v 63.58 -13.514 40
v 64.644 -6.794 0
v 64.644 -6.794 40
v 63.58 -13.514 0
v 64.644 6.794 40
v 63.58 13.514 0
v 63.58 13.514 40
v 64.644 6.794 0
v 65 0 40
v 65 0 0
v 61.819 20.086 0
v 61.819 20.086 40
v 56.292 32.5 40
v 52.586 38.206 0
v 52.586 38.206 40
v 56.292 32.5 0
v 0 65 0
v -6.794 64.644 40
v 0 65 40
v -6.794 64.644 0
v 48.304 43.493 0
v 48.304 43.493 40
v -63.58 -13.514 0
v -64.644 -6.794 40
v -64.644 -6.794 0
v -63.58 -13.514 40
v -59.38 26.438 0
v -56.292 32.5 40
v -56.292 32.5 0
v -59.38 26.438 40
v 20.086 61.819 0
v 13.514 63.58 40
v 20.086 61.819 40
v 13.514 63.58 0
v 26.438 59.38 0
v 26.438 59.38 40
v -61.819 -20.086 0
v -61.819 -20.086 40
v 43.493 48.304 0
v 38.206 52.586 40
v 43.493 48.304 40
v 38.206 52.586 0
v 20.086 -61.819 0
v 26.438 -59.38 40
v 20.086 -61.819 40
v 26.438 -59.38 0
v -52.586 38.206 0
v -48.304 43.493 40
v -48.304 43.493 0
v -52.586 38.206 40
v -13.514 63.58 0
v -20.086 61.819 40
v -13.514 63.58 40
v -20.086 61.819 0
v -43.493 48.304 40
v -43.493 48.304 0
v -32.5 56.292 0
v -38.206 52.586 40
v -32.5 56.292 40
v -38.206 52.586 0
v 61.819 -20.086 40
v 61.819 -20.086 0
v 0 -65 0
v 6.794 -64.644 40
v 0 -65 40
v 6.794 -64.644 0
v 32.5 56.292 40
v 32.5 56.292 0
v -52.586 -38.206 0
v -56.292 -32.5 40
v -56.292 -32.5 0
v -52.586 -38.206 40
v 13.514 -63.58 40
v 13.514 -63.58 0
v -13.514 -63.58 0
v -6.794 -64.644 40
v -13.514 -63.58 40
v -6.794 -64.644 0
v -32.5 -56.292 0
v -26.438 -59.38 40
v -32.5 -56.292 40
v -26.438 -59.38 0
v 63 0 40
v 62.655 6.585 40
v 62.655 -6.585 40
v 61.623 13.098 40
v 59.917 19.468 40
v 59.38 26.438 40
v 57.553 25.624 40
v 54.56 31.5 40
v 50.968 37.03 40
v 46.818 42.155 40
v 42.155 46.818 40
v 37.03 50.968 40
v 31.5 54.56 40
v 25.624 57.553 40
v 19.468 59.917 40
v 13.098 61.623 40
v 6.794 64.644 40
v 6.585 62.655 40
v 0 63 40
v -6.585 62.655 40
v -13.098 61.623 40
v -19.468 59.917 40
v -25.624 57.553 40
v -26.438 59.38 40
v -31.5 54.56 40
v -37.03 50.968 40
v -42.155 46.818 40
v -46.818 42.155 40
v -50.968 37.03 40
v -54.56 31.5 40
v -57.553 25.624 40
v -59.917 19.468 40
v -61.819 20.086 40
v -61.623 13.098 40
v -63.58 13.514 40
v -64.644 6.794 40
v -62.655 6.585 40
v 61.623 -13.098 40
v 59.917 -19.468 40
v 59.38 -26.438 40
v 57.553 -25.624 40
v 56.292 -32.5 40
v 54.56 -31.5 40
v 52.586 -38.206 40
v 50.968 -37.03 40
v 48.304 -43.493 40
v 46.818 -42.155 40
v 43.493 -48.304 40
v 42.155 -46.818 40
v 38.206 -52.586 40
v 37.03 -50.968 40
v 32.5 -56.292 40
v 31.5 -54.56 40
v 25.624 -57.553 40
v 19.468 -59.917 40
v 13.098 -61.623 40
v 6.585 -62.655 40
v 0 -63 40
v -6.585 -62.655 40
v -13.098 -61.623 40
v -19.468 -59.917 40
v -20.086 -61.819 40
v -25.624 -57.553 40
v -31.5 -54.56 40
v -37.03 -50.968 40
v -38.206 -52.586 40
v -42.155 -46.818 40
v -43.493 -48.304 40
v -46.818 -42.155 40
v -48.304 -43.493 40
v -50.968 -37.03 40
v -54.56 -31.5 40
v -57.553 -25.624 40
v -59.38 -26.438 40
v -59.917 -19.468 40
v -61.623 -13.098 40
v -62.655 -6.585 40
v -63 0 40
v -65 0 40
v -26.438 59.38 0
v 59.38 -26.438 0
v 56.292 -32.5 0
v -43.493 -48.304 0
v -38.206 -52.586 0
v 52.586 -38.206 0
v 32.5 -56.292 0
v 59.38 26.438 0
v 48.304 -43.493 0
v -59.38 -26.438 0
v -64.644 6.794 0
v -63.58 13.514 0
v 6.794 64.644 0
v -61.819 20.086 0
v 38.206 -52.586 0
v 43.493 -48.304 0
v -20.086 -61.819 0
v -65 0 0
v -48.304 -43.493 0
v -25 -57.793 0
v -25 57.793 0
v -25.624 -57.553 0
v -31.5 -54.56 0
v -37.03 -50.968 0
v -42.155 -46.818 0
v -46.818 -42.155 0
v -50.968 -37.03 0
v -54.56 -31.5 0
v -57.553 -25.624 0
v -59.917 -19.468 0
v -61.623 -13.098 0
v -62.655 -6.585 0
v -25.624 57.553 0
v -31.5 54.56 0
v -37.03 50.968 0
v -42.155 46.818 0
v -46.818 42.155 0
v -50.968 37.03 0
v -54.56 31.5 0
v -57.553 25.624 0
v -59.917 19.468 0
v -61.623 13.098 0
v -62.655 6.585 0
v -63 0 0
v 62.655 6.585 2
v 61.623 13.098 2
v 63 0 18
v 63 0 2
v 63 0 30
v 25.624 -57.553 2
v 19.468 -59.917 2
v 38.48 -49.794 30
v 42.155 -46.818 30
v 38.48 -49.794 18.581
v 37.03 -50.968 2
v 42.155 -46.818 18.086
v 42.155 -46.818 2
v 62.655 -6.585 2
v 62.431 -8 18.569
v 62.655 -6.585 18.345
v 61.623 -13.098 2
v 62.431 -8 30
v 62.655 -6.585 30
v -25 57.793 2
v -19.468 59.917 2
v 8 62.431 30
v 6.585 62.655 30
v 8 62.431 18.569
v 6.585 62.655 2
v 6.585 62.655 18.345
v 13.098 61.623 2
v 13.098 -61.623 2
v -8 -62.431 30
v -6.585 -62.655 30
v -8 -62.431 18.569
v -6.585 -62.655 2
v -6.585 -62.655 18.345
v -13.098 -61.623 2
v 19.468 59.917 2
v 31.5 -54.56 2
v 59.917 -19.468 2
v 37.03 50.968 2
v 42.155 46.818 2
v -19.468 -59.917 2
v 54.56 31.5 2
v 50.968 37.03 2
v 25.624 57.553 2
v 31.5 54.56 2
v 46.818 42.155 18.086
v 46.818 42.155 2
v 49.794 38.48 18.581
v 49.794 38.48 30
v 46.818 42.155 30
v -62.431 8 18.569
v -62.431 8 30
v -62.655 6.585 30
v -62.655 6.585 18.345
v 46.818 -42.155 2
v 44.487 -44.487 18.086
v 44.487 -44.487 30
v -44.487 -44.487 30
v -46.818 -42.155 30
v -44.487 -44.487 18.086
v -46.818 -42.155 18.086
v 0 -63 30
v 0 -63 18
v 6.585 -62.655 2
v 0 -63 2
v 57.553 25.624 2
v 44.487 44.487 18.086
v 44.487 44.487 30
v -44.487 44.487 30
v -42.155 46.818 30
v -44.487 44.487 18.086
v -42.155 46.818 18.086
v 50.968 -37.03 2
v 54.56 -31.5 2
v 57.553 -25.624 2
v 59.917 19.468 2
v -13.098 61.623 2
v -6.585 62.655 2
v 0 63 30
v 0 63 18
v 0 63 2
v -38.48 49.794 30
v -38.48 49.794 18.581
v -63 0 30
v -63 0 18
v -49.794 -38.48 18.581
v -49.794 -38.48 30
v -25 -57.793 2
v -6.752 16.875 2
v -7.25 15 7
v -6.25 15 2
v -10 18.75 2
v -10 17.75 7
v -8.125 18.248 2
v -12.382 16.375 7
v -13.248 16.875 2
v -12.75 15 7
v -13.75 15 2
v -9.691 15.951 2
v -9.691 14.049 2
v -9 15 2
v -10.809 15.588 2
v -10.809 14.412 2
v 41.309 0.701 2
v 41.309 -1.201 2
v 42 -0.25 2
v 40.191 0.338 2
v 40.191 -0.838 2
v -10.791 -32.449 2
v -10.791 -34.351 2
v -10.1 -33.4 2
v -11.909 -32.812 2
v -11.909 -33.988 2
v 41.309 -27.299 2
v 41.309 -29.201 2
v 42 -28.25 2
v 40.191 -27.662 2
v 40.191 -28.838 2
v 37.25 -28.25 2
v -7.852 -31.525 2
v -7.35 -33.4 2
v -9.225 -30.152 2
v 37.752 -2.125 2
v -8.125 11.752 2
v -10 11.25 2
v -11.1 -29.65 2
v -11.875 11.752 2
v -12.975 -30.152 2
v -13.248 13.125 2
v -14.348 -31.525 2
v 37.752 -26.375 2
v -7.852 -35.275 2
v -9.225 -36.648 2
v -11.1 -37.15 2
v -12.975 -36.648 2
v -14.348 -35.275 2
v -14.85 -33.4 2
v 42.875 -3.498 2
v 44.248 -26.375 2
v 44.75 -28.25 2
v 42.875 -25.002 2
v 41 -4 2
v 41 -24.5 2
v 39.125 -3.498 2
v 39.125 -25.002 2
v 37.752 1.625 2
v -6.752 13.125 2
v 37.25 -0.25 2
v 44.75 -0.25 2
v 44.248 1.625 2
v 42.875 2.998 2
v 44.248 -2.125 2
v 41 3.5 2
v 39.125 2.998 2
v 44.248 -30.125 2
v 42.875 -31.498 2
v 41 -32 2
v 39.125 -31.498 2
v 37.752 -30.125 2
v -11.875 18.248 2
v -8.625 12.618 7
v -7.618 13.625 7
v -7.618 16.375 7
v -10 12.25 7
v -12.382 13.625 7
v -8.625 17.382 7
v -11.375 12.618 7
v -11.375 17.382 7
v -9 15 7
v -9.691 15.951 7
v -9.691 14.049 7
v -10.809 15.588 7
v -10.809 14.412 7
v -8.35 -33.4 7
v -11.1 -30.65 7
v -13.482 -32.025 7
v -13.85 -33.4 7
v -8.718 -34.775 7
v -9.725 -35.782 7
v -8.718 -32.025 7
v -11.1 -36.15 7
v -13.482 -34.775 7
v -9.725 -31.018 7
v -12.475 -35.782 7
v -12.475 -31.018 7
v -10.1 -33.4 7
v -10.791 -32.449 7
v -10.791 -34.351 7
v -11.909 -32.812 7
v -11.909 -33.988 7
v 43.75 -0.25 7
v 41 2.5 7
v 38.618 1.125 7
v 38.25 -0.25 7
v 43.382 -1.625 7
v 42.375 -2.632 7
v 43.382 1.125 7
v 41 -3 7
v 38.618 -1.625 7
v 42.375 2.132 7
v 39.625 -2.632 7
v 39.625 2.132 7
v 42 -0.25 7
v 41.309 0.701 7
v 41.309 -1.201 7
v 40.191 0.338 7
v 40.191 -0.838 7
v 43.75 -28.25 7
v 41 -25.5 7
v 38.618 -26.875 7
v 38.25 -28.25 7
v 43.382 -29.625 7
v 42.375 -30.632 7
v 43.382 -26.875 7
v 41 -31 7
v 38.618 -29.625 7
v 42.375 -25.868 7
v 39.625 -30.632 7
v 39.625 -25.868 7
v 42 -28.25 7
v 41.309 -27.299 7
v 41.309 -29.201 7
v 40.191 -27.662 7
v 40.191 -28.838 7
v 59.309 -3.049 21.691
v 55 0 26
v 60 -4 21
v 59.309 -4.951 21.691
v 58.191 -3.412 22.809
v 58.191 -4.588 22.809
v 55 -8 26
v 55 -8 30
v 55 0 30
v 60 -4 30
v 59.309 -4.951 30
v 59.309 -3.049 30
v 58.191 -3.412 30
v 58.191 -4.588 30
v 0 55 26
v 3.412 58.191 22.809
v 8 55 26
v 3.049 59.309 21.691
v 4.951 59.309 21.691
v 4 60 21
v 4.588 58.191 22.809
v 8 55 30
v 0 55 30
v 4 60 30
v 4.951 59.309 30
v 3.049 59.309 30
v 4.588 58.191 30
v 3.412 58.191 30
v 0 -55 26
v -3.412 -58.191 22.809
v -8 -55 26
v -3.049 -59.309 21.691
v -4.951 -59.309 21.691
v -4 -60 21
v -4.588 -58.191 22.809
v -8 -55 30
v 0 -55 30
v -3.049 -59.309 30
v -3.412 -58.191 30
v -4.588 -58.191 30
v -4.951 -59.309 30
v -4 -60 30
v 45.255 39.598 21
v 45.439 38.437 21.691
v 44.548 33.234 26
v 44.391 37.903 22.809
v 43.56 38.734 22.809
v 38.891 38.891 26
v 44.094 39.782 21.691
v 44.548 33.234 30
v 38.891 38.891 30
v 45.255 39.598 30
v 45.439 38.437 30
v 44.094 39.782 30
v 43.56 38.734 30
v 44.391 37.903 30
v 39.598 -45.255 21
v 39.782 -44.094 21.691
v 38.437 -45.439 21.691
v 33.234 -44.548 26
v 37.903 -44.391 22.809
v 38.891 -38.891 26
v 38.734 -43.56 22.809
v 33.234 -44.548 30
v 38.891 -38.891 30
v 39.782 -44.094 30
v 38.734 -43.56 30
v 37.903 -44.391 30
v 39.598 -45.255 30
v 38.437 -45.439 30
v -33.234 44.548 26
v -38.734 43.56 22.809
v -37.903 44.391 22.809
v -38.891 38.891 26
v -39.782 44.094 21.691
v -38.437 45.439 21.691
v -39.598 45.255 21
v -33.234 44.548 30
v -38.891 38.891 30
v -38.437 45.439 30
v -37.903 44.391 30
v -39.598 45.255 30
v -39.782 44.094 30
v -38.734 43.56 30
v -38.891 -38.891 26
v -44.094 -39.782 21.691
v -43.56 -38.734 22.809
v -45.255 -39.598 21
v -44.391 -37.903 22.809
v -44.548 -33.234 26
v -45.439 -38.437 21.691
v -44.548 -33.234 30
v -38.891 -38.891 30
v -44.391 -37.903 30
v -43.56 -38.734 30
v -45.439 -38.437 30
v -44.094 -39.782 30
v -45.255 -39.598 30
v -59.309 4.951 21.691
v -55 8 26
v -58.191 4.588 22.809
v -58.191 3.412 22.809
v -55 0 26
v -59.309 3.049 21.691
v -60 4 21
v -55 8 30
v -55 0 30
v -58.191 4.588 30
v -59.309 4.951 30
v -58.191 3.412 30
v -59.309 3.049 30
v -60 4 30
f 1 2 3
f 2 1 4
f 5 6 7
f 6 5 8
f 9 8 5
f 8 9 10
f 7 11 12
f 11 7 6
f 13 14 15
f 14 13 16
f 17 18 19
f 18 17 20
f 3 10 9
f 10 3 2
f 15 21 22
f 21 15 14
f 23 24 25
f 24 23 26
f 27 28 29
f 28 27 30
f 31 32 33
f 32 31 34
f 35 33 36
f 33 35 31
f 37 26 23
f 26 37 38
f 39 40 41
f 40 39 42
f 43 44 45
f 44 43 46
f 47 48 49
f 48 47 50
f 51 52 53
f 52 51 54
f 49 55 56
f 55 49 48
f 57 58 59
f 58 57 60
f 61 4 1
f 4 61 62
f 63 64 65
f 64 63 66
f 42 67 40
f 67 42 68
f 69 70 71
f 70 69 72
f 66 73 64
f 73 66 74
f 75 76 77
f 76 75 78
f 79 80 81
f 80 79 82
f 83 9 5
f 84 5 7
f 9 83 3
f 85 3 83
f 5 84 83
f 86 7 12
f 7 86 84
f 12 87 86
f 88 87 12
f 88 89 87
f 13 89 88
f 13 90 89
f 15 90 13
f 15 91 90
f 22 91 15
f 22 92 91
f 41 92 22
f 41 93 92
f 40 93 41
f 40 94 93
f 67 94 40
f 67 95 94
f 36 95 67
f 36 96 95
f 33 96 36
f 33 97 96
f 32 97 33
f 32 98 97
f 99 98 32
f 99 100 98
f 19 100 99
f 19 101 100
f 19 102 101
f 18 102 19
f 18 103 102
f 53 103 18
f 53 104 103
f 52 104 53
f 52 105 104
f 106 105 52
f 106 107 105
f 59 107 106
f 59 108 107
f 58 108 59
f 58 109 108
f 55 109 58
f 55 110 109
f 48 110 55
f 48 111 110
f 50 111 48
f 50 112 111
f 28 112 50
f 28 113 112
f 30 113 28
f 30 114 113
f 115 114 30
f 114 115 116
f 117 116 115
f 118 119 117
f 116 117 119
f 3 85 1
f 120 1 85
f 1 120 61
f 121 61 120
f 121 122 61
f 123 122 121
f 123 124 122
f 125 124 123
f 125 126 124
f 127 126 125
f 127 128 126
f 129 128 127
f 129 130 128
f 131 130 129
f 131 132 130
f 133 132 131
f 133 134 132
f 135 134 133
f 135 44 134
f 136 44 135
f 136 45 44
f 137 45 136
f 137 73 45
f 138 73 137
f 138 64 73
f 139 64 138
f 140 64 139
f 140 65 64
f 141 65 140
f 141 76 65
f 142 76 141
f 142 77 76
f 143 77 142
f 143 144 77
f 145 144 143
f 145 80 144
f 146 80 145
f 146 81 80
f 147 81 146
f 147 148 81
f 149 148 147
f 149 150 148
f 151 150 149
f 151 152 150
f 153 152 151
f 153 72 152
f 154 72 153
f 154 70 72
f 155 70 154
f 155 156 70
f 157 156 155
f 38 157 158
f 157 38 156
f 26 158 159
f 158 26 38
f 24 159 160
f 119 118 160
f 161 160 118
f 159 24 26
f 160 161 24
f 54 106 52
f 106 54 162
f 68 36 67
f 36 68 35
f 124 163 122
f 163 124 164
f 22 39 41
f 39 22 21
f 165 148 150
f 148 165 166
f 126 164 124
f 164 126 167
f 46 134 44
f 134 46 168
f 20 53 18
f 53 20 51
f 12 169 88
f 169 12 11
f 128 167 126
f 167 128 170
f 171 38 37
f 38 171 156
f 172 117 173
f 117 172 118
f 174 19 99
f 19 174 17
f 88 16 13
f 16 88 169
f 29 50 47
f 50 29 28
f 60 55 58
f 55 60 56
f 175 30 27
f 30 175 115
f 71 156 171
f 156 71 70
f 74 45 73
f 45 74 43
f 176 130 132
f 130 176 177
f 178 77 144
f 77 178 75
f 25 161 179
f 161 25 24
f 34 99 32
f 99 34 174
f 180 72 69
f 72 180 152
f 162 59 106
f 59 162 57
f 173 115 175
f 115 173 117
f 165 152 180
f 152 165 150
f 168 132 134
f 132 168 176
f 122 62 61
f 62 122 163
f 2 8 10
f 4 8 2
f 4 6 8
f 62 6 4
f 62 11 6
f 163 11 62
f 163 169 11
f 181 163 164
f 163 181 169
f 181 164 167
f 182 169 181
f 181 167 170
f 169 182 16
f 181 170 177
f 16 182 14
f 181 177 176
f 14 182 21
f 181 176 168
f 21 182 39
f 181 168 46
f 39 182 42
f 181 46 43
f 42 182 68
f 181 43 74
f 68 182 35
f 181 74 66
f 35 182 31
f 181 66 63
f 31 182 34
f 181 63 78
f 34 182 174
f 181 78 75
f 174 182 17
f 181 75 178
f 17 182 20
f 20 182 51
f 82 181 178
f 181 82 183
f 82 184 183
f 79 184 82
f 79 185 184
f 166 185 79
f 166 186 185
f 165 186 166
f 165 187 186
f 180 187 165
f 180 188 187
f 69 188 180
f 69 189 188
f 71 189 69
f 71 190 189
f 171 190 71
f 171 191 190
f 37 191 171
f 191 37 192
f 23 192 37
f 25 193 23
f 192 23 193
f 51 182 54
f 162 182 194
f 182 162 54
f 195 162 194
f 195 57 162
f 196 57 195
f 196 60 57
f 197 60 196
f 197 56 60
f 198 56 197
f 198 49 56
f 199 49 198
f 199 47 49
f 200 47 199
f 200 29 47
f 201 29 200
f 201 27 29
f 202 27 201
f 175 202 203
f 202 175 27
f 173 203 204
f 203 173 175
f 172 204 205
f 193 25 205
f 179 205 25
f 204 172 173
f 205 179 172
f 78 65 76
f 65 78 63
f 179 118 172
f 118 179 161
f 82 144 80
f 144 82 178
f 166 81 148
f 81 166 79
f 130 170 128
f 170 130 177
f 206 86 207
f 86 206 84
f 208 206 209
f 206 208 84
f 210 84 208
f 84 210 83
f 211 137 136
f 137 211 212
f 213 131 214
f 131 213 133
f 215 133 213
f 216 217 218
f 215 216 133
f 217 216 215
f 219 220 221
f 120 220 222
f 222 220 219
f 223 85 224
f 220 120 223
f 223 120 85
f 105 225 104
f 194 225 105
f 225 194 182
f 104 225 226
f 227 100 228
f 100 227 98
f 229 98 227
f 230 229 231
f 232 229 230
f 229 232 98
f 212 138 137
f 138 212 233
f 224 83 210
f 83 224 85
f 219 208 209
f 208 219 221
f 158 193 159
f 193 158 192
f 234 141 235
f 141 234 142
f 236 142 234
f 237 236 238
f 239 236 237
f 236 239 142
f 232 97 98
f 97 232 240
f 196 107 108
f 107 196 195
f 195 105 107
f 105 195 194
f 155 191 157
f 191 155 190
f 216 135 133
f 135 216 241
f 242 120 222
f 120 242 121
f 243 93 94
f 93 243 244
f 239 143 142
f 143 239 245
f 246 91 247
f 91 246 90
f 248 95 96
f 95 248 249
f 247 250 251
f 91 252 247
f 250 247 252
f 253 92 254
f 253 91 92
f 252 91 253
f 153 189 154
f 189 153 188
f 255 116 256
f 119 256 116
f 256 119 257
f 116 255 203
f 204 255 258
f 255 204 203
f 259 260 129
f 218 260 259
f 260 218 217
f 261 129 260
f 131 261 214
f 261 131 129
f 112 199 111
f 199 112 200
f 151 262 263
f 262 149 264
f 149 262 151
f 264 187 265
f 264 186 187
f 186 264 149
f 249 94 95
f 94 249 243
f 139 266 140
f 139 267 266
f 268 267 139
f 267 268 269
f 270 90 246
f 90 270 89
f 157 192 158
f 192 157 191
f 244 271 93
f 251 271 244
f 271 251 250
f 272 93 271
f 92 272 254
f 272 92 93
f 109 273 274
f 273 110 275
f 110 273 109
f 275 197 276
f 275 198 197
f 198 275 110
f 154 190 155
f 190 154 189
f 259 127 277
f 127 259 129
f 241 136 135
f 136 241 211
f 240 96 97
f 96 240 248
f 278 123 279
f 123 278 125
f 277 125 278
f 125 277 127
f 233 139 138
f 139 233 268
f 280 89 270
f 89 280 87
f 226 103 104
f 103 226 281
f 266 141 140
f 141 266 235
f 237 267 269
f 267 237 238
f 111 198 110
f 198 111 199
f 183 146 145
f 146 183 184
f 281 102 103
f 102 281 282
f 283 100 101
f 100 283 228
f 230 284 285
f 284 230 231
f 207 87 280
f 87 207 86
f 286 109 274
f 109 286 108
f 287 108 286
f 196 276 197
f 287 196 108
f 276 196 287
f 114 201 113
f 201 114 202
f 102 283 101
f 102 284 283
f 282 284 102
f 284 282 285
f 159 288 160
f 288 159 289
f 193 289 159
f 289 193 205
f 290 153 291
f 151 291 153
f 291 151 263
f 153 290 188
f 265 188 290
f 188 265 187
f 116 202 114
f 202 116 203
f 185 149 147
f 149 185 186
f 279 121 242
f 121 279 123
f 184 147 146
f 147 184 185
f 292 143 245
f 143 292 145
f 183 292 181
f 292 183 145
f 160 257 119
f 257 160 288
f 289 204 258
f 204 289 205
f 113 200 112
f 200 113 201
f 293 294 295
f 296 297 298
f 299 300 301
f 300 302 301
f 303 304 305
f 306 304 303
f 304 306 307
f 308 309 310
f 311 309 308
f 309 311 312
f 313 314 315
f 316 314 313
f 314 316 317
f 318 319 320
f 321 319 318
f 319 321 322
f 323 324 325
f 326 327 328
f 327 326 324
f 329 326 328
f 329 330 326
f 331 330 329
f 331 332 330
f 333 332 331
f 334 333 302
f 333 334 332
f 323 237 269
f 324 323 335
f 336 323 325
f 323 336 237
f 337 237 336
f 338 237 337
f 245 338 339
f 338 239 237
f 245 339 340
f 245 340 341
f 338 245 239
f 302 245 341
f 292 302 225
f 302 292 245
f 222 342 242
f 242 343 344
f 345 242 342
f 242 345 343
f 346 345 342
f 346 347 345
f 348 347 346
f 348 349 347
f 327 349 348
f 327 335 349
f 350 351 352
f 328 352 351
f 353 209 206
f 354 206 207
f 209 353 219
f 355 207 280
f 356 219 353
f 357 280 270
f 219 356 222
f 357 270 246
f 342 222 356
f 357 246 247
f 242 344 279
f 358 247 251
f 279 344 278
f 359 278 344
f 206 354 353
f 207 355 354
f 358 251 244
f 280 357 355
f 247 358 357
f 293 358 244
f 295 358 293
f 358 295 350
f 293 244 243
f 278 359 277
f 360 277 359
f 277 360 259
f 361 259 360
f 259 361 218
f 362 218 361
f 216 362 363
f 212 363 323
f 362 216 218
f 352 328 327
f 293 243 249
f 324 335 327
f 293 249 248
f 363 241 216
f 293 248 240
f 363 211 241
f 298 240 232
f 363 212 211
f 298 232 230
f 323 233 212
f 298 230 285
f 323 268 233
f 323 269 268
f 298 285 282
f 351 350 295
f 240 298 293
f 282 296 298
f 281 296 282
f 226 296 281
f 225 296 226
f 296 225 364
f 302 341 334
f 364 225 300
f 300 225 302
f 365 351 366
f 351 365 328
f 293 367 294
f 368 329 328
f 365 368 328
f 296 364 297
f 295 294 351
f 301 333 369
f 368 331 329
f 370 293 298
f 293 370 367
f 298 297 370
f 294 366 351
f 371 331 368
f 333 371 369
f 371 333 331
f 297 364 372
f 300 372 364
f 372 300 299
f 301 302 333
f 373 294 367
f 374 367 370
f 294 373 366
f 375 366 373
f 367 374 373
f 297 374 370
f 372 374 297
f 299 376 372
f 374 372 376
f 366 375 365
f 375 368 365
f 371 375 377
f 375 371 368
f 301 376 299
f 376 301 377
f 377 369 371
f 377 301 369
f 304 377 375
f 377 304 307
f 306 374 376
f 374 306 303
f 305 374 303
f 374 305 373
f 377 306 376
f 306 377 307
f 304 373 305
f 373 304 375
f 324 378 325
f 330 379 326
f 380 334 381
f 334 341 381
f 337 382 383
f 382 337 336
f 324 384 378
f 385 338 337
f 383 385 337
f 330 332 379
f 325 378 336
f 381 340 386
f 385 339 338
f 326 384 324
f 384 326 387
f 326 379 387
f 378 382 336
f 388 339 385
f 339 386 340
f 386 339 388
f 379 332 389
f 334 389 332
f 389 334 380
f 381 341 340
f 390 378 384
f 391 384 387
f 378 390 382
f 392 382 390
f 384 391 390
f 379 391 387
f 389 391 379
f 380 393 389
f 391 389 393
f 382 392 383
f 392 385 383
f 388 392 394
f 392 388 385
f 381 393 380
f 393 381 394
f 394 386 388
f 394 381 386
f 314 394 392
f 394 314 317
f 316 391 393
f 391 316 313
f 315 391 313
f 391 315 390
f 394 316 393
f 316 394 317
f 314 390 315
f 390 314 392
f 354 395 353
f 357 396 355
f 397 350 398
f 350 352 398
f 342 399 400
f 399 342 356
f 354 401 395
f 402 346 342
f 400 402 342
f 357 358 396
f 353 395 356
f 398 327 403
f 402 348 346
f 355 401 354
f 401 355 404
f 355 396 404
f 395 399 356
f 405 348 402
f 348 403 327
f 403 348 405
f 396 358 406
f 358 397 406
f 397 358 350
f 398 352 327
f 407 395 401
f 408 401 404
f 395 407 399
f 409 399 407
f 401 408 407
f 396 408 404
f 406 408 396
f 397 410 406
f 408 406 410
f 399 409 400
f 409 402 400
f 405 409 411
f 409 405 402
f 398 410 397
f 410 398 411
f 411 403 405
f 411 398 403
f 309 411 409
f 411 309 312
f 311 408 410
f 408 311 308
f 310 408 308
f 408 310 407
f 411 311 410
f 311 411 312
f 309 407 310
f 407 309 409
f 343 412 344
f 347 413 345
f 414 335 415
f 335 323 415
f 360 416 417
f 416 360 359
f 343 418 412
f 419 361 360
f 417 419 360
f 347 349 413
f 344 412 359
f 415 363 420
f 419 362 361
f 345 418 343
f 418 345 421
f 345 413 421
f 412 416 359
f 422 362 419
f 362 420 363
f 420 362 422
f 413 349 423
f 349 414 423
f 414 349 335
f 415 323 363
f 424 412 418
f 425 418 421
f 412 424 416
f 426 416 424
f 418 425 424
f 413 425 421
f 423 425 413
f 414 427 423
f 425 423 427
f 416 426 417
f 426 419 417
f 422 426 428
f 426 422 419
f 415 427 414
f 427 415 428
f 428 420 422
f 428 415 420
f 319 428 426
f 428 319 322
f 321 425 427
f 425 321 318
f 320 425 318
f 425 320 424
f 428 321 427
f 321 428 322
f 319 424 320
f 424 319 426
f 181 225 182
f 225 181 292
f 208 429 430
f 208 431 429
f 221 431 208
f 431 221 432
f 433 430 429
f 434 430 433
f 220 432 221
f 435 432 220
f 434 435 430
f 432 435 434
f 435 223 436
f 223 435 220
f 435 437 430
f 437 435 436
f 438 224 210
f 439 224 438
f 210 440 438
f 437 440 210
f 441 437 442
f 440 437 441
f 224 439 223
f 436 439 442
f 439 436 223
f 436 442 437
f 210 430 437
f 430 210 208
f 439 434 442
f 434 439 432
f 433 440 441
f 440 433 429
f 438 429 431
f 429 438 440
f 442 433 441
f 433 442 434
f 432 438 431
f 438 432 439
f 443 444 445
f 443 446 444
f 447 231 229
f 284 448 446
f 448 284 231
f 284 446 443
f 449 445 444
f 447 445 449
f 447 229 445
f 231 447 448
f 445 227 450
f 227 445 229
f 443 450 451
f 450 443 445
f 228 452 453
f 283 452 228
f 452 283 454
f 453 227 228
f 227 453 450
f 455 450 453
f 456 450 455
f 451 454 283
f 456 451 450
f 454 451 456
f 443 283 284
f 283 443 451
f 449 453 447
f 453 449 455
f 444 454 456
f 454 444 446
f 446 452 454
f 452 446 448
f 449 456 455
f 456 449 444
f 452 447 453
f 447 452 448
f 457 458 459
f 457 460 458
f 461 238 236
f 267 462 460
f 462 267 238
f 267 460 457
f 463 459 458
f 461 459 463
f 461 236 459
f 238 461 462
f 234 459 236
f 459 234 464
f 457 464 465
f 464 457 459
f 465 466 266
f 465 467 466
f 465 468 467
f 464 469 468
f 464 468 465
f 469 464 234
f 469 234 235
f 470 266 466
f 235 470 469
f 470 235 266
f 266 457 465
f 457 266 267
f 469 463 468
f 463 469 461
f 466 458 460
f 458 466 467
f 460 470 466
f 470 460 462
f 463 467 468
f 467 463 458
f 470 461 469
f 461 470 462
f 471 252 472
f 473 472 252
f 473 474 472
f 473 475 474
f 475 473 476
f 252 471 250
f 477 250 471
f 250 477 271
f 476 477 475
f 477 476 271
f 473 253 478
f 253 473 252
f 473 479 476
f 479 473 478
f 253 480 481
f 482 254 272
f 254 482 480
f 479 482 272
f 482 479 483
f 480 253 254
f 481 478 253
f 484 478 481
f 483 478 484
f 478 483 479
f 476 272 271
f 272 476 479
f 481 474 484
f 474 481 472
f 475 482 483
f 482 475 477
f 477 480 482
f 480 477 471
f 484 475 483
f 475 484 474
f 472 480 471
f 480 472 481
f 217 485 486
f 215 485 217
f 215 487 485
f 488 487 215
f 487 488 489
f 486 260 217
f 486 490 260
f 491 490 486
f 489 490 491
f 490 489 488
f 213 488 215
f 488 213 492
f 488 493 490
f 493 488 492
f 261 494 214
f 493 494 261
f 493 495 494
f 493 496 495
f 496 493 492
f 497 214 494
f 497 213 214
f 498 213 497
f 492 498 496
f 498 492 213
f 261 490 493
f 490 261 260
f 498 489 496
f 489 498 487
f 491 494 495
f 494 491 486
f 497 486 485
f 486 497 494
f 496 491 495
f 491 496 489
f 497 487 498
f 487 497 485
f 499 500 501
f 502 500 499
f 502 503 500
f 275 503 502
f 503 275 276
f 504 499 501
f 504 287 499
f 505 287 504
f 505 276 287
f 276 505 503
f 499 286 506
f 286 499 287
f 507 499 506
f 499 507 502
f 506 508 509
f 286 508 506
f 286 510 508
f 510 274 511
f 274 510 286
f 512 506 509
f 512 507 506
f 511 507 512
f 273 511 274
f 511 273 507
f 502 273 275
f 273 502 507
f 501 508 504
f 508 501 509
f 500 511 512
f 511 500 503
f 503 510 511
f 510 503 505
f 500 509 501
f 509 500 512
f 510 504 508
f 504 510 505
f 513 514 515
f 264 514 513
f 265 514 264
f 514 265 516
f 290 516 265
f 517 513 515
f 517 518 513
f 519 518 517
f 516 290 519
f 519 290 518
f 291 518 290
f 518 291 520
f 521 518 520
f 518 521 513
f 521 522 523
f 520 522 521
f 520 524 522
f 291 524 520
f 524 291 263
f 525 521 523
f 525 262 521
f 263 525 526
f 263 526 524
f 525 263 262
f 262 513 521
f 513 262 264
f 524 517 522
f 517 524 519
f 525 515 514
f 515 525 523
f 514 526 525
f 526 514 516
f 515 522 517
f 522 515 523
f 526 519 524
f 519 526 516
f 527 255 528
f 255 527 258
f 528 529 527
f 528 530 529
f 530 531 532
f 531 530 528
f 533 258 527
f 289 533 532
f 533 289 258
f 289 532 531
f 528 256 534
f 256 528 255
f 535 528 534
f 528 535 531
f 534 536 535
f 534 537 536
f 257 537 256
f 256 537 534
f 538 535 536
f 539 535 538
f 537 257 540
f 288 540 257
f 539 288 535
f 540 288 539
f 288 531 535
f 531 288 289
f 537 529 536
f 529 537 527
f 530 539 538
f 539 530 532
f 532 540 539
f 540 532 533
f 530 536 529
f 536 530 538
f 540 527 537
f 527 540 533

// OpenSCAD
// file: ../caseutilities.scad
//

module RoundedBox(width,height,thickness,radius)
{
   cube([width-2*radius,height,thickness],true);  
   cube([width,height-2*radius,thickness],true);  
   translate([radius-width/2,radius-height/2,0])
     cylinder(r=radius, h=thickness, center=true);
   translate([radius-width/2,height/2-radius,0])
     cylinder(r=radius, h=thickness, center=true);
   translate([width/2-radius,height/2-radius,0])
     cylinder(r=radius, h=thickness, center=true);
   translate([width/2-radius,radius-height/2,0])
     cylinder(r=radius, h=thickness, center=true);
}

module Standoff(length, inside, outside)
{
  difference()
  {
    cylinder(r1=outside+1, r2=outside, h=length);
    cylinder(r=inside, h=length);
  }
}
module RaiseBoss(holelist)
{
  for(i=holelist){
    if(i[0]=="B") translate([i[1],i[2],0])
    {
      translate([0,0,i[4]])cylinder(r=i[7],h=i[6]);
    }
  }
}
module DrillHoles(holelist)
{
  for(i=holelist){
    if(i[0]=="C") translate([i[1],i[2],0]) cylinder(r=i[3],h=i[4]);
    if(i[0]=="B") translate([i[1],i[2],0])
    {
      cylinder(r=i[3],h=i[4]);
      translate([0,0,i[4]])cylinder(r=i[5],h=i[6]);
    }
    if(i[0]=="S")
    {
      if(i[6]==0)  translate([i[1],i[2],0]) cube([i[3],i[4],i[5]]);
      else
        translate([i[1],i[2],i[5]/2]) RoundedBox(i[3],i[4],i[5],i[6]);
    }
  }
}
module BoxPanel(width, height, thickness, edge, edgethickness, radius, holelist)
{
  shim=(thickness-edgethickness)/2;
  difference()
  {
    union()
    {
      translate([0,0,0]) rotate([90,0,90])
        RoundedBox(width-edge*2,height-edge*2,thickness,radius);
      translate([-shim,0,0]) rotate([90,0,90])
        RoundedBox(width,height,edgethickness,radius);
      translate([-2,0,0]) rotate([90,0,90])RaiseBoss(holelist);
    }
    translate([-2,0,0]) rotate([90,0,90]) DrillHoles(holelist);
  }
}

module TaperPost(inside, outside, height)
{
  difference()
  {
    union()
    {
      cylinder(r=outside-0.75, h=height);
      translate([0,0,outside]) cylinder(r1=outside, r2=outside-0.75, h=height/2-outside);
      cylinder(r=outside, h=outside);
    }
    cylinder(r=inside, h=height);
  }
}
module Keyhole(holesize, headsize, material)
{
  translate([0,0,0.25]) RoundedBox(headsize,holesize,material,holesize/2);
  translate([headsize/2,0,-0.25]) cylinder(r=headsize/2, h=material);
}
module ArdunioStandoffs(length, inside, outside)
{
  Standoff(length, inside, outside);
  translate([-1.1, -48.40, 0]) Standoff(length, inside, outside);
  translate([51, -15.25, 0]) Standoff(length, inside, outside);
  translate([51, -43.25, 0]) Standoff(length, inside, outside);
}
// file: ringlib.scad
module sleeve(od,id,h) {
  difference() {
   cylinder(r=od/2,h=h);
   cylinder(r=id/2,h=h);
  }
}

module halfdome(dia,thick) {
   difference() {
     sphere(r=dia/2);
     sphere(r=(dia-2*thick)/2);
     translate([-dia/2,-dia/2,-dia]) cube([dia,dia,dia]);
   }
}

module suspendedring(od,id,h,outside) {
  w = (od-id)/2;
  points_outside=[[0,h],[-w,h],[-w,w],[0,0]];
  points_inside=[[0,h],[-w,h],[-w,0],[0,w]];
  if(outside) {
    rotate_extrude() translate([od/2,0,0]) polygon(points_outside);
  } else {
    rotate_extrude() translate([od/2,0,0]) polygon(points_inside);
  }
}

module circleplate(r,t,w,h,wo,ho) {
  difference() {
   translate([wo,ho,0])cube([w,h,t]);
   difference() { cylinder(r=r+50,h);cylinder(r=r,h);}
  }
}

module support(width,depth,height, hashole) {
  points=[[0,height],[-depth,height],[-depth,depth],[0,0]];
  if(hashole) {
    difference() {
      rotate([90,0,0]) linear_extrude(height=width) polygon(points);
      translate([-width/2,-depth/2,3]) cylinder(r=1,h=height);
    }
  } else {
    rotate([90,0,0]) linear_extrude(height=width) polygon(points);
  }
}
module connectionring(dia,thick,height,lap){
  translate([0,0,lap-2]) {
    translate([0,0,height-4]) suspendedring(dia+2*thick,dia,lap+2,false);
    suspendedring(dia+.01,dia-2*thick,height,true);
    translate([0,0,4]) rotate([0,180,0]) suspendedring(dia+2*thick,dia,lap+2,false);
  }
}
module washer(out,in,thick) {
  difference() {
    cylinder(r=out/2,h=thick,center=true);
    cylinder(r=in/2,h=thick+.1,center=true);
  }
}

module testringlib(){
  suspendedring(124,120,5,false);
  translate([0,0,-10]) sleeve(124,120,5);
  translate([0,0,10]) halfdome(124,2.5);
  translate([0,0,-60]) connectionring(124,2,12,5, $fa=5);
  washer(10,3,1.5);
}

//testringlib();
// main file
include  <ringlib.scad>
include <../caseutilities.scad>

module body_L2() {
  dia=130;
  thick=2;
  height=40;

  pcb_height=18;
  sleeve(dia,dia-2*thick,height);

  // baseplate and Arduino pcb mount
  translate([-10,15,2]) ArdunioStandoffs(5, 1, 2.75);
  circleplate(dia/2,2,dia-30,dia,-25,-dia/2);

  //PCB mounts
  rotate([0,0,0])translate([dia/2-thick,0,pcb_height]) support(8,8,12,true);
  rotate([0,0,90])translate([dia/2-thick,0,pcb_height]) support(8,8,12,true);
  rotate([0,0,-90])translate([dia/2-thick,0,pcb_height]) support(8,8,12,true);
  rotate([0,0,45])translate([dia/2-thick,0,pcb_height]) support(8,8,12,true);
  rotate([0,0,-45])translate([dia/2-thick,0,pcb_height]) support(8,8,12,true);
  rotate([0,0,135])translate([dia/2-thick,0,pcb_height]) support(8,8,12,true);
  rotate([0,0,-135])translate([dia/2-thick,0,pcb_height]) support(8,8,12,true);
  rotate([0,0,180])translate([dia/2-thick,0,pcb_height]) support(8,8,12,true);
}

body_L2($fa=6);
